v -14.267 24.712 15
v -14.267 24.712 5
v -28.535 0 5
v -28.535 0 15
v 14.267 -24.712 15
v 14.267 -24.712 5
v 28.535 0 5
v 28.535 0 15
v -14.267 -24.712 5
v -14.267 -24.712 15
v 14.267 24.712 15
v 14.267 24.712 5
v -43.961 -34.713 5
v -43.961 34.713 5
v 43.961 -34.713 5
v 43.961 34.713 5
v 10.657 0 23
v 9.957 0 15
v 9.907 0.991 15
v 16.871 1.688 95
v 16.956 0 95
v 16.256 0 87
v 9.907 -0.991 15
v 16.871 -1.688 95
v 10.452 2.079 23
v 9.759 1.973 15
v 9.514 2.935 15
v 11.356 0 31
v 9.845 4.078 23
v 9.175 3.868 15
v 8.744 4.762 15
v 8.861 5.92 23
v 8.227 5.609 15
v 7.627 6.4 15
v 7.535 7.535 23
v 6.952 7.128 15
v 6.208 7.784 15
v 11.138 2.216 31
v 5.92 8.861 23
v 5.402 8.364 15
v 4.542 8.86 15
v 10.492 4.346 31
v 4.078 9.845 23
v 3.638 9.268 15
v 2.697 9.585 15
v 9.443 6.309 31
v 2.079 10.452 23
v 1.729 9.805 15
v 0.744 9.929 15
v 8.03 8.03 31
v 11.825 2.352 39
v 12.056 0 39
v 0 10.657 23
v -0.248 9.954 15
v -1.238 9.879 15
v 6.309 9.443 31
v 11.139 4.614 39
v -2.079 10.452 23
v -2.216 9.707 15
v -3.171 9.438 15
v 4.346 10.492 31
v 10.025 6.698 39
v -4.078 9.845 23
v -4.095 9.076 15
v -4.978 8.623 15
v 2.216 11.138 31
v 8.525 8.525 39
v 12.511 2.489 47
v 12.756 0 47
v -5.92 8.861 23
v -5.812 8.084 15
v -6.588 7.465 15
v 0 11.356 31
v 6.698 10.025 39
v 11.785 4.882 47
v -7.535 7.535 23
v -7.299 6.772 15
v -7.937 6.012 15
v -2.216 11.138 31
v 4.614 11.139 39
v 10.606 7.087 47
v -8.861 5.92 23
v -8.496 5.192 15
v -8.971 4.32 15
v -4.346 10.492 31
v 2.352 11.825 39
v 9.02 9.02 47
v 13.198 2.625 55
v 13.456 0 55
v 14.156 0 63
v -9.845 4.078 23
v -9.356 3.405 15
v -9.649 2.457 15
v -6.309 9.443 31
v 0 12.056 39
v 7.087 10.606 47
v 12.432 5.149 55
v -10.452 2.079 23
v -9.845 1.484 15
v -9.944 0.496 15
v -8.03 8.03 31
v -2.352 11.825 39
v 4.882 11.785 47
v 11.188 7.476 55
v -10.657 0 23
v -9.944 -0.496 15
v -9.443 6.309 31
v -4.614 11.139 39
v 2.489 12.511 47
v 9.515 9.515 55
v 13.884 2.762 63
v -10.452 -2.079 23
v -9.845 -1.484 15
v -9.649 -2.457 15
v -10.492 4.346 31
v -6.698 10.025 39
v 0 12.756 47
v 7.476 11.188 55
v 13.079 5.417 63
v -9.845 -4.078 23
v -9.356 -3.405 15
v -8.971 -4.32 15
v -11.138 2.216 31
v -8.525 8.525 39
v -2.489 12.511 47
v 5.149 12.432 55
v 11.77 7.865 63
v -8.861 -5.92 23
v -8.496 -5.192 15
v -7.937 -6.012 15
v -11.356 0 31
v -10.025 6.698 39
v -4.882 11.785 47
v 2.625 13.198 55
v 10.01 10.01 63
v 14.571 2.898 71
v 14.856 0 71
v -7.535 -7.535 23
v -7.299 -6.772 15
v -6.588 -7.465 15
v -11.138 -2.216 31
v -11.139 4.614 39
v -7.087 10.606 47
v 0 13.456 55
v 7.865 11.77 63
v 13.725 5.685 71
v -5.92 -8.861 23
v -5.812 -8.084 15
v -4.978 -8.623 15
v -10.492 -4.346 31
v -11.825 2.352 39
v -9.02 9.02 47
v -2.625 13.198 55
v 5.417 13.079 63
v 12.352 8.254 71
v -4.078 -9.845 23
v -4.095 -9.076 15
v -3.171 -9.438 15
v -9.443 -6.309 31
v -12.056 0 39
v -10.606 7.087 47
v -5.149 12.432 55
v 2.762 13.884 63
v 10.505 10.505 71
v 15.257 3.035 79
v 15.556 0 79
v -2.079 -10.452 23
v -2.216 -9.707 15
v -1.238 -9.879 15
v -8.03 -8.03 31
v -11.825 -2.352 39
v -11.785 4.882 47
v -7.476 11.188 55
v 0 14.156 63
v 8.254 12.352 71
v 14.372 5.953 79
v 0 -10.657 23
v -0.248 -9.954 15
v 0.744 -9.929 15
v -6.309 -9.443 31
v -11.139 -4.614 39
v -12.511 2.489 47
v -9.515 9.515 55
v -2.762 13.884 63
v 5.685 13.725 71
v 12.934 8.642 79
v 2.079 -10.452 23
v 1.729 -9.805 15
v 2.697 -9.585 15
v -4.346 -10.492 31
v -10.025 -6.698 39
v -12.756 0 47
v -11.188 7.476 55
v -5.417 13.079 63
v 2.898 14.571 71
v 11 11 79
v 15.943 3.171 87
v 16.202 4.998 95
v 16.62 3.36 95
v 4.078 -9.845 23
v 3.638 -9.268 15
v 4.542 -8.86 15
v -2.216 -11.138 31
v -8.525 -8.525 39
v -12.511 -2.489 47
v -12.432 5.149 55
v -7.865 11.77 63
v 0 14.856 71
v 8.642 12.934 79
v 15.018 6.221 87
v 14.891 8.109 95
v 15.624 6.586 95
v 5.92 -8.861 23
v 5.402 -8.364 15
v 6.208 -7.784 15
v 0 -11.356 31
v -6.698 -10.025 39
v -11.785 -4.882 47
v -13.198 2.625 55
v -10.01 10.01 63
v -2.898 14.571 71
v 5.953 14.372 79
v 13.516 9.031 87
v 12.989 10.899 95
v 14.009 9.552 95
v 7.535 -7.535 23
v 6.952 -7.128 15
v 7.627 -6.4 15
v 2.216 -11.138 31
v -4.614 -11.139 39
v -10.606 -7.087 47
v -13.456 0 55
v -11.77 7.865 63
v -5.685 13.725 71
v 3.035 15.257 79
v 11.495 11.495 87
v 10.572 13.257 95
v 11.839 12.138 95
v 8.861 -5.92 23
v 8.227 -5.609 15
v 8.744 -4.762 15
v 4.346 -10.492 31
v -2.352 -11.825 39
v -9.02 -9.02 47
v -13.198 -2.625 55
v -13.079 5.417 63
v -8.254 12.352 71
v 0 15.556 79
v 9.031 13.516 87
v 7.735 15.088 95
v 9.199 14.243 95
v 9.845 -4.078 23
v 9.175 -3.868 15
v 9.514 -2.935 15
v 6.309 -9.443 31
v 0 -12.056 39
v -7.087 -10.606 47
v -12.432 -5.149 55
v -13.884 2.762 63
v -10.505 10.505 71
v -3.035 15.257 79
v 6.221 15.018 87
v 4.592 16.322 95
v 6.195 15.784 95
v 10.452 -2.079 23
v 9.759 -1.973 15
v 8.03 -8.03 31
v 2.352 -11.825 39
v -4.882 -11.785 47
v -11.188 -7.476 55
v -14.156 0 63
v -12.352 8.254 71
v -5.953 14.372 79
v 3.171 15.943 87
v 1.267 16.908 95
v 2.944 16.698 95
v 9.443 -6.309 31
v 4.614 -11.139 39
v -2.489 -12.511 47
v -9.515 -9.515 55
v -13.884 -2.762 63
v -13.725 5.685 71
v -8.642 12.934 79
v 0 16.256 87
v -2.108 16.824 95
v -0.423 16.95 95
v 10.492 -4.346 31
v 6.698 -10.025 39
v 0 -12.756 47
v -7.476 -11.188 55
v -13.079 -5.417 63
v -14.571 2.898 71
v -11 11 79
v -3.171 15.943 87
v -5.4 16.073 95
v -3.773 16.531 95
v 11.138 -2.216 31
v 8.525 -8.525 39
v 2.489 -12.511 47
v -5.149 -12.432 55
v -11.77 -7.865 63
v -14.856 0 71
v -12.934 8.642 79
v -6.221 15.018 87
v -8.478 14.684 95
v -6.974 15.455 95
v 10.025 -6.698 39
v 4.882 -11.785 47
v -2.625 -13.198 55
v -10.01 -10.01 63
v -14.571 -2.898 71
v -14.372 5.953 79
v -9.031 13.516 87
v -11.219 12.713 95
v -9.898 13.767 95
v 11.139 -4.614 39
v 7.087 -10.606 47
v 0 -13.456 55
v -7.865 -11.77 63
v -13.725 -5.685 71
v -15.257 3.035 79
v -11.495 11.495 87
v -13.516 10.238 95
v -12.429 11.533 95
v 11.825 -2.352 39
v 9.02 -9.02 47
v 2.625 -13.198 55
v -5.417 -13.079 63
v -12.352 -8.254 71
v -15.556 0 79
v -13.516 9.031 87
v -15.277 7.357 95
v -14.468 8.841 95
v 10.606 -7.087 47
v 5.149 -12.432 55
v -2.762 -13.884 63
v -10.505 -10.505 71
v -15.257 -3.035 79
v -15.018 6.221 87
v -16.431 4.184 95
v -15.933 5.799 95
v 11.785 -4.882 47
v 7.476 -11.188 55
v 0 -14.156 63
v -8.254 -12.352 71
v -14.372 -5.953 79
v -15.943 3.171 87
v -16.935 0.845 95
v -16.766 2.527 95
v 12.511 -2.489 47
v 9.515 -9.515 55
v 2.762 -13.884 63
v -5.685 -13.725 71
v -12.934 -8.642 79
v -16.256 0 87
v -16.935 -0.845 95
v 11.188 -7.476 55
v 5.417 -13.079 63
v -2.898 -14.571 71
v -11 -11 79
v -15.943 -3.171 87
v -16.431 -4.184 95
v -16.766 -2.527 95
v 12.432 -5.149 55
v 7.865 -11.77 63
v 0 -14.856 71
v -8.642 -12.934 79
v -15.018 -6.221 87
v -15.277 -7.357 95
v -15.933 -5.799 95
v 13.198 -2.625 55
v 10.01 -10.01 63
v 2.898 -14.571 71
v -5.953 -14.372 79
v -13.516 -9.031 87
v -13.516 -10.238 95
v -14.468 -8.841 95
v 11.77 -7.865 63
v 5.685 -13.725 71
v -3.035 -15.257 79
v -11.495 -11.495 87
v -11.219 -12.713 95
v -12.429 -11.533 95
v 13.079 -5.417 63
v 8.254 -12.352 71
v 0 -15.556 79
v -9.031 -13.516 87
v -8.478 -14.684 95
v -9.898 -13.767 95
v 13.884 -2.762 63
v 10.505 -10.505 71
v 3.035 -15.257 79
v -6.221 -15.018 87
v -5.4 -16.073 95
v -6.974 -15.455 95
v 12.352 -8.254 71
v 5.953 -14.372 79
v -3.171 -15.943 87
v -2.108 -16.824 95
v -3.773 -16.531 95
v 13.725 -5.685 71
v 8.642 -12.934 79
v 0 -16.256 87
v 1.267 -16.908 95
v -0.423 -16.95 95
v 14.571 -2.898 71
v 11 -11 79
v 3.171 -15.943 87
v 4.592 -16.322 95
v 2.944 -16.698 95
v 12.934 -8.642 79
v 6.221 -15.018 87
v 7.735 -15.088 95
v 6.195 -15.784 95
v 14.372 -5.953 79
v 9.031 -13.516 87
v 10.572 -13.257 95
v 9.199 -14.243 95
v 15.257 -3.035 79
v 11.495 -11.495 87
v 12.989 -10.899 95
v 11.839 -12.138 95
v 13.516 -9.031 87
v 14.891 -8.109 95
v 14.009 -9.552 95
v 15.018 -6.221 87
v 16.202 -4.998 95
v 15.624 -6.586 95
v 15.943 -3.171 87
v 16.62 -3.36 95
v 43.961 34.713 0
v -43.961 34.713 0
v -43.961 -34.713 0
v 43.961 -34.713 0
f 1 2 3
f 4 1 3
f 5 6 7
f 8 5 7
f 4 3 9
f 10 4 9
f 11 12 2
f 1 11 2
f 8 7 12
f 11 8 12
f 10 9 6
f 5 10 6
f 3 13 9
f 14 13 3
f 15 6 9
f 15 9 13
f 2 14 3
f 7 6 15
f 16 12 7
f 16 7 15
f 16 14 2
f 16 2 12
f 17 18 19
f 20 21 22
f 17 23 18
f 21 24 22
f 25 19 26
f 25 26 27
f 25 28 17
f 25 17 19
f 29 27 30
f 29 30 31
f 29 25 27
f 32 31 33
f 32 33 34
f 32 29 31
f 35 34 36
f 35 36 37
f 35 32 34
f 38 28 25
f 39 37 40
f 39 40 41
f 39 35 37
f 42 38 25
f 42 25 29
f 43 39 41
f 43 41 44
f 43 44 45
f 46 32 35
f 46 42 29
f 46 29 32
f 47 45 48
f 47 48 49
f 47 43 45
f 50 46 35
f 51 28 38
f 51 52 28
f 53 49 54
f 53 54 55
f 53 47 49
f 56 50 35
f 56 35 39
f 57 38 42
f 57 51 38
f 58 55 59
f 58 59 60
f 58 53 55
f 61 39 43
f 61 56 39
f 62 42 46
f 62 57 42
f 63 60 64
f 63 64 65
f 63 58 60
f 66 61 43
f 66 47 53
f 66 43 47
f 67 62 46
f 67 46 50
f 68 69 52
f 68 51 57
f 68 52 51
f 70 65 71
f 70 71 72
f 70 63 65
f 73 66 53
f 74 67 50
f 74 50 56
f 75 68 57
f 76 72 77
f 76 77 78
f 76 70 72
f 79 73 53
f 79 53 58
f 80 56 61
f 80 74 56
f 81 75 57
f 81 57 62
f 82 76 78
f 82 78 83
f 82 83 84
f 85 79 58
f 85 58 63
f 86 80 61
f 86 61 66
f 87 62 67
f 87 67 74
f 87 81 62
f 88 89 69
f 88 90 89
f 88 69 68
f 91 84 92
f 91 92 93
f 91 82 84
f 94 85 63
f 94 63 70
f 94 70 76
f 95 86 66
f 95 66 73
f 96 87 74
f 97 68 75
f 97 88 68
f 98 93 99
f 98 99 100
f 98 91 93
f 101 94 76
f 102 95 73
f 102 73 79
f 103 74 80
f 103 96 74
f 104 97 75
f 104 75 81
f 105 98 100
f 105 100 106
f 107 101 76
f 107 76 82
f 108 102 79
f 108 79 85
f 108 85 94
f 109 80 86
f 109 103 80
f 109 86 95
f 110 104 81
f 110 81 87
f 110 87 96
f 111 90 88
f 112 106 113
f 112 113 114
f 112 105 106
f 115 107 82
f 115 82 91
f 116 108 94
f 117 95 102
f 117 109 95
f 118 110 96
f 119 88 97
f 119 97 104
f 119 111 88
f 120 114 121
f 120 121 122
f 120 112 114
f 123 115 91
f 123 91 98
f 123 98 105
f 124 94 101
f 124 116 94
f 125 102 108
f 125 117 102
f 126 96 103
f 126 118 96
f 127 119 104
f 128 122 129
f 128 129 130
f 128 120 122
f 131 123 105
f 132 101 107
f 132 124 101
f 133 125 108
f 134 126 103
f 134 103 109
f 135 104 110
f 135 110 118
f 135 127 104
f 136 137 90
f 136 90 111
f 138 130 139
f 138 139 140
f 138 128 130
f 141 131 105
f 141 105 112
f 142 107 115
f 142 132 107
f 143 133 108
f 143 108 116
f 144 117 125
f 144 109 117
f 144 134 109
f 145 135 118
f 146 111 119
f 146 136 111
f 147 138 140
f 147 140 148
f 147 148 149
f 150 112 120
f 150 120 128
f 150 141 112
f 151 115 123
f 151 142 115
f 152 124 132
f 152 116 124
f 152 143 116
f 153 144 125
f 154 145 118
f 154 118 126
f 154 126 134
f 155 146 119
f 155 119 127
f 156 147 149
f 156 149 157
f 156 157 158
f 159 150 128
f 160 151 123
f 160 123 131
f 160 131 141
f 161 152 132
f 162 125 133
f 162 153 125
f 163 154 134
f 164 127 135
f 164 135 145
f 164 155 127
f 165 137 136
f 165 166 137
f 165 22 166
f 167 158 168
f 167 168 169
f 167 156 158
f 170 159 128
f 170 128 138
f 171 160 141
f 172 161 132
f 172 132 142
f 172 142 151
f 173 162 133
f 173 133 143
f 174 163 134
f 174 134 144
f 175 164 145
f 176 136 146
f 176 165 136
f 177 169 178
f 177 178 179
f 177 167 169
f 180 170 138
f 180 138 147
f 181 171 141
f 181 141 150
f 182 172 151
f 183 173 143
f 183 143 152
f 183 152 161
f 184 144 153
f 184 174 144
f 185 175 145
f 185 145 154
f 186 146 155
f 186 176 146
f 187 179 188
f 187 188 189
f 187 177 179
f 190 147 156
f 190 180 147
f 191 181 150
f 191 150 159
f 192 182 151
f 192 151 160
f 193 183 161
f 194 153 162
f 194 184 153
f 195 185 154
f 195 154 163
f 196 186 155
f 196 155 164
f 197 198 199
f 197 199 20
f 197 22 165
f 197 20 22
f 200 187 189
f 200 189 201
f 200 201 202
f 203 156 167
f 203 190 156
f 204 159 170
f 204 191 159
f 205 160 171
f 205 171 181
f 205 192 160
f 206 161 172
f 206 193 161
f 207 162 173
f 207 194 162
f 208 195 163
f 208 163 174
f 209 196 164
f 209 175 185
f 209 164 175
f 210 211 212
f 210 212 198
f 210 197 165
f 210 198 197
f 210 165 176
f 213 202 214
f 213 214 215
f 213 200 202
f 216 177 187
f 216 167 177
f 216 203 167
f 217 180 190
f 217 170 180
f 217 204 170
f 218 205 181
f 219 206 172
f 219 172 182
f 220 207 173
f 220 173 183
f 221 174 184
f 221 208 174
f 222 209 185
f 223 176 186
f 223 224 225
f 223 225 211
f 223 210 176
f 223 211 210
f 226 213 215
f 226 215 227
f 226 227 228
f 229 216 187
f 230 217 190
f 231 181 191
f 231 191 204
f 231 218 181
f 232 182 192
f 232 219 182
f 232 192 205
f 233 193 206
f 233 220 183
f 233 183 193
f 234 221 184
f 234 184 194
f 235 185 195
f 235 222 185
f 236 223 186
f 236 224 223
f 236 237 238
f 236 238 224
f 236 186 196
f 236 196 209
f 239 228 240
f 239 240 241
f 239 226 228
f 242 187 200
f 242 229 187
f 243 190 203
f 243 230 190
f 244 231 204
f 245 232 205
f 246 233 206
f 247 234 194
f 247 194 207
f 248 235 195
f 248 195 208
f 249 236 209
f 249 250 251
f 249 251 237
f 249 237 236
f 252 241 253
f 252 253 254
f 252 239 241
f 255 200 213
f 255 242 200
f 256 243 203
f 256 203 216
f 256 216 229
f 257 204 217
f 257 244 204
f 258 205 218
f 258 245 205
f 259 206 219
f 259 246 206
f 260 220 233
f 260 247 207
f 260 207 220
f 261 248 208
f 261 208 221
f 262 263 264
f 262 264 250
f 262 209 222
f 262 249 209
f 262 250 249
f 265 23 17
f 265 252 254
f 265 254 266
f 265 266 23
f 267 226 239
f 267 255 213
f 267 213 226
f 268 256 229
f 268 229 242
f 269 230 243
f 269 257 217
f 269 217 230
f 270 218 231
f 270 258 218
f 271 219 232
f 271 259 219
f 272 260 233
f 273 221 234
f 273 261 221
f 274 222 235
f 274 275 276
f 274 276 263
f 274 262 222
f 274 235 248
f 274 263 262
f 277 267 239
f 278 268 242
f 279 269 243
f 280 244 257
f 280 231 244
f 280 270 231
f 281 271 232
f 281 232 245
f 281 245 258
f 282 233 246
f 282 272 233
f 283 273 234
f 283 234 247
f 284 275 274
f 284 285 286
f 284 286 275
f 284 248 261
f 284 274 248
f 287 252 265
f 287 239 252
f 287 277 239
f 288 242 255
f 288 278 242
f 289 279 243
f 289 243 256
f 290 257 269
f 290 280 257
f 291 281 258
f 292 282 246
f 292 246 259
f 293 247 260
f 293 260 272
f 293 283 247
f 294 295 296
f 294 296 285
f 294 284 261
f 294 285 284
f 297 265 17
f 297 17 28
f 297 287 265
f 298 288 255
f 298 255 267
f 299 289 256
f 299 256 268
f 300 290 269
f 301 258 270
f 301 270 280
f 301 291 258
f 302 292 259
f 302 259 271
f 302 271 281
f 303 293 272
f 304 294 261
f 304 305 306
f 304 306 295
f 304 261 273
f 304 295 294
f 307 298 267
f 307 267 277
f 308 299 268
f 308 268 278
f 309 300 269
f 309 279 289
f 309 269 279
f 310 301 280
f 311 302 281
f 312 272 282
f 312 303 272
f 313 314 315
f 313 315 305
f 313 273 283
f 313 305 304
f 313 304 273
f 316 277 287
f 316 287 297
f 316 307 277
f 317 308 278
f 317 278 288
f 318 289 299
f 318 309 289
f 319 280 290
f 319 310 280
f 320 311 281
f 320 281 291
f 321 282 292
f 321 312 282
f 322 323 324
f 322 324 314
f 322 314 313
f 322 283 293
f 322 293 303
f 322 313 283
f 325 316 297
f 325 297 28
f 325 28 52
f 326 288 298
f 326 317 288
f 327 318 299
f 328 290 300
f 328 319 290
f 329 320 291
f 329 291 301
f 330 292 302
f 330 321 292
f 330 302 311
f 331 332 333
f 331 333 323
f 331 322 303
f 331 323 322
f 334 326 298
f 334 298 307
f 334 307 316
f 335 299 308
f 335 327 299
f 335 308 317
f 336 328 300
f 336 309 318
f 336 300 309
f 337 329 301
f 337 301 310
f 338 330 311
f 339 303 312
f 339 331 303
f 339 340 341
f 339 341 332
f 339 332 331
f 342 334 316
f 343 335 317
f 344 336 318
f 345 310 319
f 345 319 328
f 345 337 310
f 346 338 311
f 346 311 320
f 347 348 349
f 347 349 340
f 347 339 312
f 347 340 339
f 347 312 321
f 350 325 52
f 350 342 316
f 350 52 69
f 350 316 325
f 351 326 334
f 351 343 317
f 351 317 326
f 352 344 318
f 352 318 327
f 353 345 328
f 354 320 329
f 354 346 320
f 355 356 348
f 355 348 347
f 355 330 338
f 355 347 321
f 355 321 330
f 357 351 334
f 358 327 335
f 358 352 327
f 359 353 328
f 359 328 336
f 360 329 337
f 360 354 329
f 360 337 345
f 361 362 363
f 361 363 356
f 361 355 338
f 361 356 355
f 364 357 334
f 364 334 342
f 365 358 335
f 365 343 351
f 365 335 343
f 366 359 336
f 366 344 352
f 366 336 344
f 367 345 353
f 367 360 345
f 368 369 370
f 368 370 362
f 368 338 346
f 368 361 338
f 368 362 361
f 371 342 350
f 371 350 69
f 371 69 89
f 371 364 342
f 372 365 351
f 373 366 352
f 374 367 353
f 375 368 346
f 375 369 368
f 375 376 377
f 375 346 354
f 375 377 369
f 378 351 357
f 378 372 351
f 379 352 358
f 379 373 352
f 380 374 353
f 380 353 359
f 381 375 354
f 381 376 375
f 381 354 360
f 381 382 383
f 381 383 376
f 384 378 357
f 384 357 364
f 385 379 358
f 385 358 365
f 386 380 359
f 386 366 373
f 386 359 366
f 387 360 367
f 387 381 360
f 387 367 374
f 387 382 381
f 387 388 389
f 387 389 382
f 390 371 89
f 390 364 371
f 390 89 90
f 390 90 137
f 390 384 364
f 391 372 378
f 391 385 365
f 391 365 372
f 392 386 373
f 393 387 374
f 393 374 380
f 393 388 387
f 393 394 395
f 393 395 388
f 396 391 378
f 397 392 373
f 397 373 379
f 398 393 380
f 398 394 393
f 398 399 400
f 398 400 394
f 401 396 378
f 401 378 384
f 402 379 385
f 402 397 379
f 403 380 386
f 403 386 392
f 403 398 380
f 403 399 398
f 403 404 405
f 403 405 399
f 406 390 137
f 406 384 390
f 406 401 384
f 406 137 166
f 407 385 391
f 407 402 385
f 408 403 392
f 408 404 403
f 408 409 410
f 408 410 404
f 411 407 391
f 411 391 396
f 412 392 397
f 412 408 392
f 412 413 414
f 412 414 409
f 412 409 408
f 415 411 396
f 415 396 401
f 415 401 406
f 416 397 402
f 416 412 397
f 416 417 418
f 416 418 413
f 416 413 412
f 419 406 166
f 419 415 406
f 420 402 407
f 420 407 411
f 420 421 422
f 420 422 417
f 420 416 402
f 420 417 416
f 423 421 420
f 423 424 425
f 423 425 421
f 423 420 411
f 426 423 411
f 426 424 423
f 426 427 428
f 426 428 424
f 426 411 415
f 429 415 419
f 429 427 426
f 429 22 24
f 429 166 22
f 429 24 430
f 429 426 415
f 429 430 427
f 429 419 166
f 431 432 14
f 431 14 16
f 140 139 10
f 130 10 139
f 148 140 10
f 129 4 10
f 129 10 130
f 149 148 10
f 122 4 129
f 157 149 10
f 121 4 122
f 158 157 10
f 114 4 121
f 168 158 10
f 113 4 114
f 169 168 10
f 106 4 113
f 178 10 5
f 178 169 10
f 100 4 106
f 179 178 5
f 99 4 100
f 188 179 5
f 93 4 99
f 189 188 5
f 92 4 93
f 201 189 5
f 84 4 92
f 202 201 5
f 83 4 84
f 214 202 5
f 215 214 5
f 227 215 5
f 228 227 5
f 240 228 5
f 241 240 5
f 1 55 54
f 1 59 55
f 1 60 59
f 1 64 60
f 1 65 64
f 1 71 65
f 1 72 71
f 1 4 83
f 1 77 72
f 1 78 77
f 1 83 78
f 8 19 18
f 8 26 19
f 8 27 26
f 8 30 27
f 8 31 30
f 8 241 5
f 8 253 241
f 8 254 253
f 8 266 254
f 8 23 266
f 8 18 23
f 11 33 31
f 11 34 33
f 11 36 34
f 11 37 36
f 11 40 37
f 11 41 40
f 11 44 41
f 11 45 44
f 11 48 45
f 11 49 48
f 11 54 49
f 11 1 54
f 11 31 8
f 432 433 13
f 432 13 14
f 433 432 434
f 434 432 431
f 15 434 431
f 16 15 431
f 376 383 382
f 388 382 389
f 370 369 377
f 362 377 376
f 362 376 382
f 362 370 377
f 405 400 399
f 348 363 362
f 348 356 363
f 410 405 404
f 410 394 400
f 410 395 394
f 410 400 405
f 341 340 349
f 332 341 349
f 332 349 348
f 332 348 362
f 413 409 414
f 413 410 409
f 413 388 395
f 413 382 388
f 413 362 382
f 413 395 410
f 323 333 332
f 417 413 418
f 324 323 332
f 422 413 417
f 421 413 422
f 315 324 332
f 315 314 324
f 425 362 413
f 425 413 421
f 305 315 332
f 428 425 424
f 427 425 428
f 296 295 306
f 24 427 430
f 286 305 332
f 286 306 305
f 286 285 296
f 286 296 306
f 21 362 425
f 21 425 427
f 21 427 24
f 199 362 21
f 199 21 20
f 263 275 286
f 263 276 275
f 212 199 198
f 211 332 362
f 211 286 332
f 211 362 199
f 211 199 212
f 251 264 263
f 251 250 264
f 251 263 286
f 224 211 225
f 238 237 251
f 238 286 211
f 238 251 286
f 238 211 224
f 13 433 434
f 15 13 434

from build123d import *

# Parameters (mm, degrees)
F0_W     = 87.9223719239
F0_H     = 69.4261789322
F1_DEPTH = 5
F3_DEPTH = 10
F4_R     = 9.9566569638
F5_DEPTH = 80
F5_TAPER = -5


with BuildPart() as f1:
    # F0 (on Top) → F1 (new body)
    with BuildSketch(Plane.XY):
        Rectangle(F0_W, F0_H)
    extrude(amount=F1_DEPTH)

    # F2 (on face) → F3 (join)
    with BuildSketch(Plane.XY.offset(5)):
        Polygon((14.2674572932, 24.7119609267), (-14.2674572932, 24.7119609267), (-28.5349145864, 0), (-14.2674572932, -24.7119609267), (14.2674572932, -24.7119609267), (28.5349145864, 0), align=None)
    extrude(amount=F3_DEPTH)

    # F4 (on face) → F5 (join)
    with BuildSketch(Plane.XY.offset(15)):
        Circle(F4_R)
    extrude(amount=F5_DEPTH, taper=F5_TAPER)


solid = f1.part
